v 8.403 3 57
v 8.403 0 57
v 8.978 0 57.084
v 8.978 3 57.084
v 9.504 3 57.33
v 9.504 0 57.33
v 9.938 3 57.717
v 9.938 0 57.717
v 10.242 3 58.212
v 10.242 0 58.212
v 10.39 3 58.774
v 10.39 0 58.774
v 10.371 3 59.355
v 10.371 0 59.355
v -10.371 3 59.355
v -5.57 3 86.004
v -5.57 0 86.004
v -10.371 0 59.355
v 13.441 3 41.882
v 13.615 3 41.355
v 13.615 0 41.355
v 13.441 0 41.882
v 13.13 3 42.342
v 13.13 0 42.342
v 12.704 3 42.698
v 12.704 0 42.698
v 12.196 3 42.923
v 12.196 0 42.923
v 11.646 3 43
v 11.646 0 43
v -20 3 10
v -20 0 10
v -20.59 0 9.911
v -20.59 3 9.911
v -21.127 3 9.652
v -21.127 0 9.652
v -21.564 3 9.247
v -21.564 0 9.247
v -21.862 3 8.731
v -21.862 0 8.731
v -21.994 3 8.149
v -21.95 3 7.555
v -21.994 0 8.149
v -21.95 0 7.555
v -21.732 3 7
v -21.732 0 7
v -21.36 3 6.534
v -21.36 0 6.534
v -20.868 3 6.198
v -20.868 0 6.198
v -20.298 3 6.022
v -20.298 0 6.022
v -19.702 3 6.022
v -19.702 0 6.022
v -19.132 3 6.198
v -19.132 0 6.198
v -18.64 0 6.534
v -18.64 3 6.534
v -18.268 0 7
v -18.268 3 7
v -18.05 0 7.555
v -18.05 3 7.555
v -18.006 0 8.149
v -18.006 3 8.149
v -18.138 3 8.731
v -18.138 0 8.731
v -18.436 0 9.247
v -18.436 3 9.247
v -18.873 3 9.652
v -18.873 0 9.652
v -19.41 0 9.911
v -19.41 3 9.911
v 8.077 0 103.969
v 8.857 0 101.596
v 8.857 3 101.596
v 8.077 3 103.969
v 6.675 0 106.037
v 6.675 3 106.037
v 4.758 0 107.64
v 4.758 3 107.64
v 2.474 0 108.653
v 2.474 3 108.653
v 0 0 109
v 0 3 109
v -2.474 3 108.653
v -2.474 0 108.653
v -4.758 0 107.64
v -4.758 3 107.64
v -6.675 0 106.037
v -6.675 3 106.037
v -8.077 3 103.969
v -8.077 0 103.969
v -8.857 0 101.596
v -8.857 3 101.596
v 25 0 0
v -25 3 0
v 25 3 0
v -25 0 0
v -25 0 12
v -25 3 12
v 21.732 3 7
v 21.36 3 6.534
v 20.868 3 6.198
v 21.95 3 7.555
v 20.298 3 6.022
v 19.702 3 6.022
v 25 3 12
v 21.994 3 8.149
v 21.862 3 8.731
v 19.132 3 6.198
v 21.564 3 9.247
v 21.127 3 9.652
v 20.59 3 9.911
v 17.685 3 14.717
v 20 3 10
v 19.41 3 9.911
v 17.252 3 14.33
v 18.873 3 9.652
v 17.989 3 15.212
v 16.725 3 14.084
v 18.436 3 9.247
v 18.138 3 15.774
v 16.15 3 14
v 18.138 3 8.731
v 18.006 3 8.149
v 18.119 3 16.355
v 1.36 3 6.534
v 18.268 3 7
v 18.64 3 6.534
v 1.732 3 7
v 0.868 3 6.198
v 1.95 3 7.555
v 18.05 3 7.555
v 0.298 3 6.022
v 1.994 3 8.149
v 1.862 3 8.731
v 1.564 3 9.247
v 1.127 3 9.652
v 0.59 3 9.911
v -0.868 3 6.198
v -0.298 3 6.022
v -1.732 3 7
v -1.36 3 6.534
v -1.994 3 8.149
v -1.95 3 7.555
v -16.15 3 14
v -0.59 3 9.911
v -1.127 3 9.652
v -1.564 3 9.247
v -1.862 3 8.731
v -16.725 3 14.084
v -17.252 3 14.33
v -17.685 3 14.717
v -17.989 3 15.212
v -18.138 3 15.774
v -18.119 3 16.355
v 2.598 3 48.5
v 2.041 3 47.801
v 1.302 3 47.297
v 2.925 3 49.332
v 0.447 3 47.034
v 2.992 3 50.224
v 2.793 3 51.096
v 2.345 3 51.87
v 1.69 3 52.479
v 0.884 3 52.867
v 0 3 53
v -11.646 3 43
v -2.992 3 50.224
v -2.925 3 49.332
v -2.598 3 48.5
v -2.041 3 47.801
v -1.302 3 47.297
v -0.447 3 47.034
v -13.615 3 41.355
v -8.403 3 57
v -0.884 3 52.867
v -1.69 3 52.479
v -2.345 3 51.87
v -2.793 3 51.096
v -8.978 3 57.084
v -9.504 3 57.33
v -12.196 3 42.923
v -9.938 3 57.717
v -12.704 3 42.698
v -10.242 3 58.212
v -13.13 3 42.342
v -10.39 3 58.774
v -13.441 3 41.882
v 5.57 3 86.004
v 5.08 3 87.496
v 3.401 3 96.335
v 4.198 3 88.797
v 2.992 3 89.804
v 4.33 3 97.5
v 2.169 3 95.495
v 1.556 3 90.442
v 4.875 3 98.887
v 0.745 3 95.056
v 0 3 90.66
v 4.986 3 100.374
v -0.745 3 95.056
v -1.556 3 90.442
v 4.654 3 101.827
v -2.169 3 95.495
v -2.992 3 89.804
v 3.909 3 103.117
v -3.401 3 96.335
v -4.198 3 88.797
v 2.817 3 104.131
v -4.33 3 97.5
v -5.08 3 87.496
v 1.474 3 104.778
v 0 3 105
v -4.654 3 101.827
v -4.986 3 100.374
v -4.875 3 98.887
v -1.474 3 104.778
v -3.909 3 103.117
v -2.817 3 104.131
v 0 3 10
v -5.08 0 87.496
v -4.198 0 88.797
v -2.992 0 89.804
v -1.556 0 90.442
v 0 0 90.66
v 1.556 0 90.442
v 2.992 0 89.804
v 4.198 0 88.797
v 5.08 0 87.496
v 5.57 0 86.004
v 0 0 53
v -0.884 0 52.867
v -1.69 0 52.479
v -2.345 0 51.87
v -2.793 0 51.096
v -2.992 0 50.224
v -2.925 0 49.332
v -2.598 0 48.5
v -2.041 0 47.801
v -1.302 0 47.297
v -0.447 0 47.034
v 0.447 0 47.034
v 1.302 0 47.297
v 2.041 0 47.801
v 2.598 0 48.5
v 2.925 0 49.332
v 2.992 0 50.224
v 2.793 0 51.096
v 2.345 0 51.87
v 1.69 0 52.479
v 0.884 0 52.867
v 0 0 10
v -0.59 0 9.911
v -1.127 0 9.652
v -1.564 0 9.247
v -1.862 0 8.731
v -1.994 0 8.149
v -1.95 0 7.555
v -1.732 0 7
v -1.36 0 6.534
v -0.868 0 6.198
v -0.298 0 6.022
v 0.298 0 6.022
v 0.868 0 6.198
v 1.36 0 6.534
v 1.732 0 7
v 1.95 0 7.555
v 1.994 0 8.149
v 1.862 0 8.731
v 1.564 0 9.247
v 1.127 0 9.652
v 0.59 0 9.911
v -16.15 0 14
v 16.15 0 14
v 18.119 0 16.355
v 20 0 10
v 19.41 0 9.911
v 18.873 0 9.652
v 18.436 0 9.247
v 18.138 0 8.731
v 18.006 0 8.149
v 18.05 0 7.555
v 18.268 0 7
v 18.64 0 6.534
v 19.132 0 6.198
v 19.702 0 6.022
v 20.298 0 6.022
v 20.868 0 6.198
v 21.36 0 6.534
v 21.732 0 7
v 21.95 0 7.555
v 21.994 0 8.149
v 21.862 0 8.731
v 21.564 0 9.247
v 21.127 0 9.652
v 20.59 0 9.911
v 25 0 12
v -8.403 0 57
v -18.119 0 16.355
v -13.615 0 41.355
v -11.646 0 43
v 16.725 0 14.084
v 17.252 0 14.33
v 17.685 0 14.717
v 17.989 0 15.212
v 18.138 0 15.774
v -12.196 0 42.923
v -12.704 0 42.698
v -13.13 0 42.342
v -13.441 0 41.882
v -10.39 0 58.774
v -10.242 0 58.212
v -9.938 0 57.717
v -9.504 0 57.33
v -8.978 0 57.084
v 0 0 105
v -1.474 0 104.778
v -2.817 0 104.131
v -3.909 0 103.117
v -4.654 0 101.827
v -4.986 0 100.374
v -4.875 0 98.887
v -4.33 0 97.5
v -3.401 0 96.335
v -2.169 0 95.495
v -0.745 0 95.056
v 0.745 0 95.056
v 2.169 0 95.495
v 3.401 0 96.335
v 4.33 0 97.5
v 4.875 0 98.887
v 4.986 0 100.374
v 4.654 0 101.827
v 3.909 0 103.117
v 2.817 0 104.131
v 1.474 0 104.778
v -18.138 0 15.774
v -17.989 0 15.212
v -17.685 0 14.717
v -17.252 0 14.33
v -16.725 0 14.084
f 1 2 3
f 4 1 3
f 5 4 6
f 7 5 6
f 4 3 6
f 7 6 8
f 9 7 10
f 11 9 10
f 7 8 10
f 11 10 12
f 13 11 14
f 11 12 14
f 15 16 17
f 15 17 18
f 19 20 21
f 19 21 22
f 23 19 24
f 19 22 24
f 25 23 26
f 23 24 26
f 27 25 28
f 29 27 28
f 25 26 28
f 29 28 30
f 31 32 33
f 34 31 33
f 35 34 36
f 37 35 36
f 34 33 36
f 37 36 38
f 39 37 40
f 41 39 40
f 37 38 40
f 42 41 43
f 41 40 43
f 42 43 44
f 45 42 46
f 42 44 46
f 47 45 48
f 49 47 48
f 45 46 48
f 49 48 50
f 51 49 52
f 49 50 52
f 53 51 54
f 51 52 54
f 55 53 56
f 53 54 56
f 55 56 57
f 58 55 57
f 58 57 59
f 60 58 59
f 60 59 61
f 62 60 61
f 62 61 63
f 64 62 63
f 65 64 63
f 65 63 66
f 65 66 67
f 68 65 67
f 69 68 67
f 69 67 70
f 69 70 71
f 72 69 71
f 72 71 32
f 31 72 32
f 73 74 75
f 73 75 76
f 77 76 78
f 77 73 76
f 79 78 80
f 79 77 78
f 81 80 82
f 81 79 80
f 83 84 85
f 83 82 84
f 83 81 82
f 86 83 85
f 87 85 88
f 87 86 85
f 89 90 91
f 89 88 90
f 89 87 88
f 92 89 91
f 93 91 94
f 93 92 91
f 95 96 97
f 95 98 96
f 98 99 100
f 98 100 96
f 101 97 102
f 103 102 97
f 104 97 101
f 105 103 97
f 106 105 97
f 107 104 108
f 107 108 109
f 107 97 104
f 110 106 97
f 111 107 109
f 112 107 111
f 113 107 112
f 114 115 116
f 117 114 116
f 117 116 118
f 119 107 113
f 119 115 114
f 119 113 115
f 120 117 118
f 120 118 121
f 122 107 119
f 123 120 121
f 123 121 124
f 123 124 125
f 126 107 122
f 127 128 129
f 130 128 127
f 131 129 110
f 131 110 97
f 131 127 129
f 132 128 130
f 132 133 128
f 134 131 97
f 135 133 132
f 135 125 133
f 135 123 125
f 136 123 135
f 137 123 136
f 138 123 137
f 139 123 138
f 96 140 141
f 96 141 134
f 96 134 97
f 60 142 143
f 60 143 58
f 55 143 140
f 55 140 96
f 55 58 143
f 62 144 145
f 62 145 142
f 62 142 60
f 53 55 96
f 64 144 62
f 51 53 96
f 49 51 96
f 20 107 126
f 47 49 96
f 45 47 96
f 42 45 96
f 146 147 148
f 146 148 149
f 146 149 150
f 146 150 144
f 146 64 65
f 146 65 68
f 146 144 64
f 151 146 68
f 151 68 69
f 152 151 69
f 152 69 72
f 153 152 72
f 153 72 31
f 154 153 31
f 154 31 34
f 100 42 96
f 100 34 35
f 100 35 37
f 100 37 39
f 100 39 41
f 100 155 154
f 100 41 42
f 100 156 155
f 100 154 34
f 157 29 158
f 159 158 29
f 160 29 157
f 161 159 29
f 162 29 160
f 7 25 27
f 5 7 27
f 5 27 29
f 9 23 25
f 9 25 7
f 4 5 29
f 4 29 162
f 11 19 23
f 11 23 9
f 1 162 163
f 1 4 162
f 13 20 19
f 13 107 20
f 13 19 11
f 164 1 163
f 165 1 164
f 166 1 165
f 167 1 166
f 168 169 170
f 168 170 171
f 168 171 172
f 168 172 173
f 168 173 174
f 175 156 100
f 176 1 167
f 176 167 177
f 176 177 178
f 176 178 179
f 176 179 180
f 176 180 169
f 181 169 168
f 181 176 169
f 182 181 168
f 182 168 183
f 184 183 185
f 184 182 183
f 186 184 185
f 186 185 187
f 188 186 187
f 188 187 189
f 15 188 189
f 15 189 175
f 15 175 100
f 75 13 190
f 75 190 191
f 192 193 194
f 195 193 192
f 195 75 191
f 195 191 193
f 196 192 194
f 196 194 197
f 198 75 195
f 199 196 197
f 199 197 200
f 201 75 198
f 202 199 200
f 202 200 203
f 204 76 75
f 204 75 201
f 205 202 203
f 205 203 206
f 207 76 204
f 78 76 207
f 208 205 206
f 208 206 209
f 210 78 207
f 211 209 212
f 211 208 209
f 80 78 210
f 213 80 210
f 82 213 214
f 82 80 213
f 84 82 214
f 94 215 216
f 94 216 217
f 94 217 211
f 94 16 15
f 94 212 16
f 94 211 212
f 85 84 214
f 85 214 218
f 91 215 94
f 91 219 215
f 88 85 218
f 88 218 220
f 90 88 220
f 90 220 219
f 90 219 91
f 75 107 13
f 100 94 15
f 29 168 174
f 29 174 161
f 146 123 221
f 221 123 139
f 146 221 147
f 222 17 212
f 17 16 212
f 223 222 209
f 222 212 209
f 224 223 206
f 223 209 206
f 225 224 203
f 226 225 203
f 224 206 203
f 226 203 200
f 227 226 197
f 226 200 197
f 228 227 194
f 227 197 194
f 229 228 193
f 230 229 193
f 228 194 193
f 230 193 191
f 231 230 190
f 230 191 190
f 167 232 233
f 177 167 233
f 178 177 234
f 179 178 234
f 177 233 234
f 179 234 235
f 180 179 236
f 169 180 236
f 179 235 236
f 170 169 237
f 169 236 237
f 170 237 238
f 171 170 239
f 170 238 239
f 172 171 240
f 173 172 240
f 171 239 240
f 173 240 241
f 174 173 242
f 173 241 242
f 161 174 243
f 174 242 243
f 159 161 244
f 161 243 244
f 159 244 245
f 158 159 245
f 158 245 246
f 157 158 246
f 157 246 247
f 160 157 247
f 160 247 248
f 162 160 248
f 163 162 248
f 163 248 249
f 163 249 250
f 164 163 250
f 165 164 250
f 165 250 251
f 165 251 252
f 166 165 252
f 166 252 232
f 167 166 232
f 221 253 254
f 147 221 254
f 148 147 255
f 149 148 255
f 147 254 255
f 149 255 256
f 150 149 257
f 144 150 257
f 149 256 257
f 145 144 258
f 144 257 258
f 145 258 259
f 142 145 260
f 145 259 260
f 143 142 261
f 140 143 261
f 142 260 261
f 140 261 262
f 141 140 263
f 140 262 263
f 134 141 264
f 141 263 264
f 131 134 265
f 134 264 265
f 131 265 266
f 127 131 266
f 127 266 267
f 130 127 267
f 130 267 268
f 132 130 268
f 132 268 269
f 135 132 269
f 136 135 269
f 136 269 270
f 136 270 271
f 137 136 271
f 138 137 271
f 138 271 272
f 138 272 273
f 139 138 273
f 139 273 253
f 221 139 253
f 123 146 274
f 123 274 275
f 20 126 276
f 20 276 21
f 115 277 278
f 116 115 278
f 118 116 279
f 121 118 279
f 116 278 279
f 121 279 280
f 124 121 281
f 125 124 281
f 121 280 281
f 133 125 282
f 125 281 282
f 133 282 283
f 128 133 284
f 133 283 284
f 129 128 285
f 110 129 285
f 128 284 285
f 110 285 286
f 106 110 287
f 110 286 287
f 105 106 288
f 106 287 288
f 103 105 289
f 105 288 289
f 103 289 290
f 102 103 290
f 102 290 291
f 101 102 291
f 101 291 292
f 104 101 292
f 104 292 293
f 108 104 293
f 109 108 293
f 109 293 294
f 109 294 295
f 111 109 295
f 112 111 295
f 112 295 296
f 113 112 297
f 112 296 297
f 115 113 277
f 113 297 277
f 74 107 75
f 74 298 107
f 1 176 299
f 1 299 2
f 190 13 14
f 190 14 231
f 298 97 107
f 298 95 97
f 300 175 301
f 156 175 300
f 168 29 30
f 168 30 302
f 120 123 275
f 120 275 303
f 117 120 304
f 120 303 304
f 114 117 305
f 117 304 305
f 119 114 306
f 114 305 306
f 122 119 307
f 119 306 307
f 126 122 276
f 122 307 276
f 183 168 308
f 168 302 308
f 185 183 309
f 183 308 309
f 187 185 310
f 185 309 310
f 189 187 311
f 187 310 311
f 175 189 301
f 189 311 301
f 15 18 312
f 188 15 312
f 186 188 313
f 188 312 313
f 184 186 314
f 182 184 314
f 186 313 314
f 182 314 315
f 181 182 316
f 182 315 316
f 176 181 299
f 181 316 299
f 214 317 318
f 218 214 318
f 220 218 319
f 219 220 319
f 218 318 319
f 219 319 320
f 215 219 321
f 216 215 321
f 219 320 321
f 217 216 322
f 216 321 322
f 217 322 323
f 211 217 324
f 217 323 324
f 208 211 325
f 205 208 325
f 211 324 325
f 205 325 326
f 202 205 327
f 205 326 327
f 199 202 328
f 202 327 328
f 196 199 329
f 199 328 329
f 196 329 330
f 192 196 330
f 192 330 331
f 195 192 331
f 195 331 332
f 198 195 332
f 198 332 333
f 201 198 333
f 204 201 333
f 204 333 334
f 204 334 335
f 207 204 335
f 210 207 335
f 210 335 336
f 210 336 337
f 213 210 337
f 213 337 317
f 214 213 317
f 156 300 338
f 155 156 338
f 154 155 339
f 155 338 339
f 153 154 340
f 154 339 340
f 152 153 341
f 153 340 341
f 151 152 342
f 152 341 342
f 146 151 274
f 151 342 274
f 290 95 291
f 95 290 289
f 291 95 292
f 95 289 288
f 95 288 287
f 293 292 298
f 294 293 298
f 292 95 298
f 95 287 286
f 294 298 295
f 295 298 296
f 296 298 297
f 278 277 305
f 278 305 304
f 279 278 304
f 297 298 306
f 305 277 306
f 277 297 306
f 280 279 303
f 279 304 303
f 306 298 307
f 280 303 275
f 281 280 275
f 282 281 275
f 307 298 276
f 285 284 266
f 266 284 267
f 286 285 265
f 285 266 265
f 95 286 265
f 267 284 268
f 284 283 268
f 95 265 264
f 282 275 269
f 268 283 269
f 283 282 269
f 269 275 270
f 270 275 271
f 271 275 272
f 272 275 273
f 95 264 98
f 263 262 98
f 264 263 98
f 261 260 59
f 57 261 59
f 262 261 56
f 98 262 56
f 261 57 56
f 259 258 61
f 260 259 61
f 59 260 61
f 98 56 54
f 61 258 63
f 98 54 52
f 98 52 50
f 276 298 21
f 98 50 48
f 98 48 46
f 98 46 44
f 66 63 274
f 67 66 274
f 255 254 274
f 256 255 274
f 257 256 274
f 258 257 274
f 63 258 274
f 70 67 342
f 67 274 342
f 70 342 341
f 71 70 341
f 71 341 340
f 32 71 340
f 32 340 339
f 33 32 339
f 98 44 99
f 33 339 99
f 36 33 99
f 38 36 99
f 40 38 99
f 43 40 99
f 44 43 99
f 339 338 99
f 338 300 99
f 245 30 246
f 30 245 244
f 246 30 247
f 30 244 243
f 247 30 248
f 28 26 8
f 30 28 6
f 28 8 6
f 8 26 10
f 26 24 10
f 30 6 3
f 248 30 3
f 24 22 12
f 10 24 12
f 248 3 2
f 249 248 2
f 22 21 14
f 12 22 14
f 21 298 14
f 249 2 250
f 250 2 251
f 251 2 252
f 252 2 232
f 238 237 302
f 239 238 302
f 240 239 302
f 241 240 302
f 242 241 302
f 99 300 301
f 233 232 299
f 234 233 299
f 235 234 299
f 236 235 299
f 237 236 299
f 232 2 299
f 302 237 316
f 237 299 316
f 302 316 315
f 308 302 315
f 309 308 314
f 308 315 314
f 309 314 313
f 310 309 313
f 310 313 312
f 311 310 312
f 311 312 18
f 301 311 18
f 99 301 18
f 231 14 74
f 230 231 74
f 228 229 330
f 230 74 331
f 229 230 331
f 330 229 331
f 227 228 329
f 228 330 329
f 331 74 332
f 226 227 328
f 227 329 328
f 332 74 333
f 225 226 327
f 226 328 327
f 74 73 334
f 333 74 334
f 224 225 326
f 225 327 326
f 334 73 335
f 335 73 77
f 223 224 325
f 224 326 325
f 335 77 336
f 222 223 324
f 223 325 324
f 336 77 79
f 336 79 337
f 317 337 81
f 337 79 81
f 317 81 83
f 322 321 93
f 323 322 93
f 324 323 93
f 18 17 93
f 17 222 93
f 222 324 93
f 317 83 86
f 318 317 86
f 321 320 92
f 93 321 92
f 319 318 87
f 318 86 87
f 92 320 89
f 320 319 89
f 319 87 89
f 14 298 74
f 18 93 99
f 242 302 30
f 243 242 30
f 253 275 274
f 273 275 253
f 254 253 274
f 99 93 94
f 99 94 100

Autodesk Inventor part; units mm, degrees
ref_plane "YZ Plane" through (0, 0, 0) normal (1, 0, 0) x (0, 1, 0)
ref_plane "XZ Plane" through (0, 0, 0) normal (0, 1, 0) x (-1, 0, 0)
ref_plane "XY Plane" through (0, 0, 0) normal (0, 0, 1) x (1, 0, 0)
sketch "Skizze1" plane through (0, 0, 0) normal (0, 1, 0) x (-1, 0, 0)
  line L0 (25, 0) -> (-25, 0)
  line L1 (-25, 0) -> (-25, 12)
  line L2 (-25, 12) -> (-8.8574, 101.5958)
  arc A0 (8.8574, 101.5958) -> (-8.8574, 101.5958) centre (0, 100) ccw
  line L3 (8.8574, 101.5958) -> (25, 12)
  line L4 (25, 12) -> (25, 0)
  line L5 (0, 100) -> (0, 0) construction
  dimension "d0" = 100
  dimension "d1" = 12
  dimension "d2" = 50
  dimension "d3" = 9
extrude "Extrusion1" add sketch "Skizze1" along normal blind 3
sketch "Skizze3" plane through (0, 3, 0) normal (0, 1, 0) x (1, 0, 0)
  arc A0 (-8.8574, -101.5958) -> (8.8574, -101.5958) centre (0, -100) ccw projected
  point P0 (0, 0)
  point P1 (0, -100)
hole "Bohrung1" at (0, 3, 100) direction (0, -1, 0) diameter 10 depth 3
sketch "Skizze4" plane through (0, 3, 0) normal (0, 1, 0) x (1, 0, 0)
  line L0 (-10.7957, -57) -> (10.7957, -57)
  line L1 (10.7957, -57) -> (5.5701, -86.0036)
  arc A0 (-5.5701, -86.0036) -> (5.5701, -86.0036) centre (0, -85) ccw
  line L2 (-5.5701, -86.0036) -> (-10.7957, -57)
  line L3 (25, 0) -> (-25, 0) projected
  line L4 (8.8574, -101.5958) -> (25, -12) projected
  line L5 (-25, -12) -> (-8.8574, -101.5958) projected
  circle A1 centre (0, -100) radius 5 projected
  point P0 (0, 0)
  point P1 (0, 0)
  dimension "d13" = 15
  dimension "d14" = 6
  dimension "d15" = 43
extrude "Extrusion2" cut sketch "Skizze4" against normal up to surface (3 mm away) contours L0 L1 A0 L2
sketch "Skizze5" plane through (0, 3, 0) normal (0, 1, 0) x (1, 0, 0)
  line L0 (13.3181, -43) -> (-13.3181, -43)
  line L1 (-13.3181, -43) -> (-18.543, -14)
  line L2 (-18.543, -14) -> (18.543, -14)
  line L3 (18.543, -14) -> (13.3181, -43)
  line L4 (8.8574, -101.5958) -> (25, -12) projected
  line L5 (-25, -12) -> (-8.8574, -101.5958) projected
  line L6 (25, 0) -> (-25, 0) projected
  line L7 (-10.7957, -57) -> (10.7957, -57) projected
  point P0 (0, 0)
  point P1 (0, -14)
  point P2 (0, 0)
  dimension "d18" = 6
  dimension "d19" = 14
  dimension "d20" = 14
extrude "Extrusion3" cut sketch "Skizze5" against normal up to surface (3 mm away)
sketch "Skizze6" plane through (0, 3, 0) normal (0, 1, 0) x (1, 0, 0)
  line L0 (25, 0) -> (-25, 0) projected
  line L1 (-10.7957, -57) -> (10.7957, -57) projected
  point P0 (0, 0)
  point P1 (0, -50)
  point P2 (0, 0)
  dimension "d30" = 7
hole "Bohrung2" at (0, 3, 50) direction (0, -1, 0) diameter 6 end through all
fillet "Rundung1" radius 2 6 edges at (10.7957, 1.5, 57) (-10.7957, 1.5, 57) (-13.3181, 1.5, 43) (13.3181, 1.5, 43) (18.543, 1.5, 14) (-18.543, 1.5, 14)
sketch "Skizze7" plane through (0, 3, 0) normal (0, 1, 0) x (1, 0, 0)
  line L0 (25, -12) -> (25, 0) projected
  line L1 (-25, 0) -> (-25, -12) projected
  line L2 (25, 0) -> (-25, 0) projected
  point P0 (0, 0)
  point P1 (20, -8)
  point P2 (0, -8)
  point P3 (-20, -8)
  dimension "d39" = 5
  dimension "d40" = 5
  dimension "d41" = 20
  dimension "d42" = 8
hole "Bohrung3" at (20, 3, 8) at (0, 3, 8) at (-20, 3, 8) direction (0, -1, 0) diameter 4 end through all
properties part number "1171" material "Aluminium 6061"
